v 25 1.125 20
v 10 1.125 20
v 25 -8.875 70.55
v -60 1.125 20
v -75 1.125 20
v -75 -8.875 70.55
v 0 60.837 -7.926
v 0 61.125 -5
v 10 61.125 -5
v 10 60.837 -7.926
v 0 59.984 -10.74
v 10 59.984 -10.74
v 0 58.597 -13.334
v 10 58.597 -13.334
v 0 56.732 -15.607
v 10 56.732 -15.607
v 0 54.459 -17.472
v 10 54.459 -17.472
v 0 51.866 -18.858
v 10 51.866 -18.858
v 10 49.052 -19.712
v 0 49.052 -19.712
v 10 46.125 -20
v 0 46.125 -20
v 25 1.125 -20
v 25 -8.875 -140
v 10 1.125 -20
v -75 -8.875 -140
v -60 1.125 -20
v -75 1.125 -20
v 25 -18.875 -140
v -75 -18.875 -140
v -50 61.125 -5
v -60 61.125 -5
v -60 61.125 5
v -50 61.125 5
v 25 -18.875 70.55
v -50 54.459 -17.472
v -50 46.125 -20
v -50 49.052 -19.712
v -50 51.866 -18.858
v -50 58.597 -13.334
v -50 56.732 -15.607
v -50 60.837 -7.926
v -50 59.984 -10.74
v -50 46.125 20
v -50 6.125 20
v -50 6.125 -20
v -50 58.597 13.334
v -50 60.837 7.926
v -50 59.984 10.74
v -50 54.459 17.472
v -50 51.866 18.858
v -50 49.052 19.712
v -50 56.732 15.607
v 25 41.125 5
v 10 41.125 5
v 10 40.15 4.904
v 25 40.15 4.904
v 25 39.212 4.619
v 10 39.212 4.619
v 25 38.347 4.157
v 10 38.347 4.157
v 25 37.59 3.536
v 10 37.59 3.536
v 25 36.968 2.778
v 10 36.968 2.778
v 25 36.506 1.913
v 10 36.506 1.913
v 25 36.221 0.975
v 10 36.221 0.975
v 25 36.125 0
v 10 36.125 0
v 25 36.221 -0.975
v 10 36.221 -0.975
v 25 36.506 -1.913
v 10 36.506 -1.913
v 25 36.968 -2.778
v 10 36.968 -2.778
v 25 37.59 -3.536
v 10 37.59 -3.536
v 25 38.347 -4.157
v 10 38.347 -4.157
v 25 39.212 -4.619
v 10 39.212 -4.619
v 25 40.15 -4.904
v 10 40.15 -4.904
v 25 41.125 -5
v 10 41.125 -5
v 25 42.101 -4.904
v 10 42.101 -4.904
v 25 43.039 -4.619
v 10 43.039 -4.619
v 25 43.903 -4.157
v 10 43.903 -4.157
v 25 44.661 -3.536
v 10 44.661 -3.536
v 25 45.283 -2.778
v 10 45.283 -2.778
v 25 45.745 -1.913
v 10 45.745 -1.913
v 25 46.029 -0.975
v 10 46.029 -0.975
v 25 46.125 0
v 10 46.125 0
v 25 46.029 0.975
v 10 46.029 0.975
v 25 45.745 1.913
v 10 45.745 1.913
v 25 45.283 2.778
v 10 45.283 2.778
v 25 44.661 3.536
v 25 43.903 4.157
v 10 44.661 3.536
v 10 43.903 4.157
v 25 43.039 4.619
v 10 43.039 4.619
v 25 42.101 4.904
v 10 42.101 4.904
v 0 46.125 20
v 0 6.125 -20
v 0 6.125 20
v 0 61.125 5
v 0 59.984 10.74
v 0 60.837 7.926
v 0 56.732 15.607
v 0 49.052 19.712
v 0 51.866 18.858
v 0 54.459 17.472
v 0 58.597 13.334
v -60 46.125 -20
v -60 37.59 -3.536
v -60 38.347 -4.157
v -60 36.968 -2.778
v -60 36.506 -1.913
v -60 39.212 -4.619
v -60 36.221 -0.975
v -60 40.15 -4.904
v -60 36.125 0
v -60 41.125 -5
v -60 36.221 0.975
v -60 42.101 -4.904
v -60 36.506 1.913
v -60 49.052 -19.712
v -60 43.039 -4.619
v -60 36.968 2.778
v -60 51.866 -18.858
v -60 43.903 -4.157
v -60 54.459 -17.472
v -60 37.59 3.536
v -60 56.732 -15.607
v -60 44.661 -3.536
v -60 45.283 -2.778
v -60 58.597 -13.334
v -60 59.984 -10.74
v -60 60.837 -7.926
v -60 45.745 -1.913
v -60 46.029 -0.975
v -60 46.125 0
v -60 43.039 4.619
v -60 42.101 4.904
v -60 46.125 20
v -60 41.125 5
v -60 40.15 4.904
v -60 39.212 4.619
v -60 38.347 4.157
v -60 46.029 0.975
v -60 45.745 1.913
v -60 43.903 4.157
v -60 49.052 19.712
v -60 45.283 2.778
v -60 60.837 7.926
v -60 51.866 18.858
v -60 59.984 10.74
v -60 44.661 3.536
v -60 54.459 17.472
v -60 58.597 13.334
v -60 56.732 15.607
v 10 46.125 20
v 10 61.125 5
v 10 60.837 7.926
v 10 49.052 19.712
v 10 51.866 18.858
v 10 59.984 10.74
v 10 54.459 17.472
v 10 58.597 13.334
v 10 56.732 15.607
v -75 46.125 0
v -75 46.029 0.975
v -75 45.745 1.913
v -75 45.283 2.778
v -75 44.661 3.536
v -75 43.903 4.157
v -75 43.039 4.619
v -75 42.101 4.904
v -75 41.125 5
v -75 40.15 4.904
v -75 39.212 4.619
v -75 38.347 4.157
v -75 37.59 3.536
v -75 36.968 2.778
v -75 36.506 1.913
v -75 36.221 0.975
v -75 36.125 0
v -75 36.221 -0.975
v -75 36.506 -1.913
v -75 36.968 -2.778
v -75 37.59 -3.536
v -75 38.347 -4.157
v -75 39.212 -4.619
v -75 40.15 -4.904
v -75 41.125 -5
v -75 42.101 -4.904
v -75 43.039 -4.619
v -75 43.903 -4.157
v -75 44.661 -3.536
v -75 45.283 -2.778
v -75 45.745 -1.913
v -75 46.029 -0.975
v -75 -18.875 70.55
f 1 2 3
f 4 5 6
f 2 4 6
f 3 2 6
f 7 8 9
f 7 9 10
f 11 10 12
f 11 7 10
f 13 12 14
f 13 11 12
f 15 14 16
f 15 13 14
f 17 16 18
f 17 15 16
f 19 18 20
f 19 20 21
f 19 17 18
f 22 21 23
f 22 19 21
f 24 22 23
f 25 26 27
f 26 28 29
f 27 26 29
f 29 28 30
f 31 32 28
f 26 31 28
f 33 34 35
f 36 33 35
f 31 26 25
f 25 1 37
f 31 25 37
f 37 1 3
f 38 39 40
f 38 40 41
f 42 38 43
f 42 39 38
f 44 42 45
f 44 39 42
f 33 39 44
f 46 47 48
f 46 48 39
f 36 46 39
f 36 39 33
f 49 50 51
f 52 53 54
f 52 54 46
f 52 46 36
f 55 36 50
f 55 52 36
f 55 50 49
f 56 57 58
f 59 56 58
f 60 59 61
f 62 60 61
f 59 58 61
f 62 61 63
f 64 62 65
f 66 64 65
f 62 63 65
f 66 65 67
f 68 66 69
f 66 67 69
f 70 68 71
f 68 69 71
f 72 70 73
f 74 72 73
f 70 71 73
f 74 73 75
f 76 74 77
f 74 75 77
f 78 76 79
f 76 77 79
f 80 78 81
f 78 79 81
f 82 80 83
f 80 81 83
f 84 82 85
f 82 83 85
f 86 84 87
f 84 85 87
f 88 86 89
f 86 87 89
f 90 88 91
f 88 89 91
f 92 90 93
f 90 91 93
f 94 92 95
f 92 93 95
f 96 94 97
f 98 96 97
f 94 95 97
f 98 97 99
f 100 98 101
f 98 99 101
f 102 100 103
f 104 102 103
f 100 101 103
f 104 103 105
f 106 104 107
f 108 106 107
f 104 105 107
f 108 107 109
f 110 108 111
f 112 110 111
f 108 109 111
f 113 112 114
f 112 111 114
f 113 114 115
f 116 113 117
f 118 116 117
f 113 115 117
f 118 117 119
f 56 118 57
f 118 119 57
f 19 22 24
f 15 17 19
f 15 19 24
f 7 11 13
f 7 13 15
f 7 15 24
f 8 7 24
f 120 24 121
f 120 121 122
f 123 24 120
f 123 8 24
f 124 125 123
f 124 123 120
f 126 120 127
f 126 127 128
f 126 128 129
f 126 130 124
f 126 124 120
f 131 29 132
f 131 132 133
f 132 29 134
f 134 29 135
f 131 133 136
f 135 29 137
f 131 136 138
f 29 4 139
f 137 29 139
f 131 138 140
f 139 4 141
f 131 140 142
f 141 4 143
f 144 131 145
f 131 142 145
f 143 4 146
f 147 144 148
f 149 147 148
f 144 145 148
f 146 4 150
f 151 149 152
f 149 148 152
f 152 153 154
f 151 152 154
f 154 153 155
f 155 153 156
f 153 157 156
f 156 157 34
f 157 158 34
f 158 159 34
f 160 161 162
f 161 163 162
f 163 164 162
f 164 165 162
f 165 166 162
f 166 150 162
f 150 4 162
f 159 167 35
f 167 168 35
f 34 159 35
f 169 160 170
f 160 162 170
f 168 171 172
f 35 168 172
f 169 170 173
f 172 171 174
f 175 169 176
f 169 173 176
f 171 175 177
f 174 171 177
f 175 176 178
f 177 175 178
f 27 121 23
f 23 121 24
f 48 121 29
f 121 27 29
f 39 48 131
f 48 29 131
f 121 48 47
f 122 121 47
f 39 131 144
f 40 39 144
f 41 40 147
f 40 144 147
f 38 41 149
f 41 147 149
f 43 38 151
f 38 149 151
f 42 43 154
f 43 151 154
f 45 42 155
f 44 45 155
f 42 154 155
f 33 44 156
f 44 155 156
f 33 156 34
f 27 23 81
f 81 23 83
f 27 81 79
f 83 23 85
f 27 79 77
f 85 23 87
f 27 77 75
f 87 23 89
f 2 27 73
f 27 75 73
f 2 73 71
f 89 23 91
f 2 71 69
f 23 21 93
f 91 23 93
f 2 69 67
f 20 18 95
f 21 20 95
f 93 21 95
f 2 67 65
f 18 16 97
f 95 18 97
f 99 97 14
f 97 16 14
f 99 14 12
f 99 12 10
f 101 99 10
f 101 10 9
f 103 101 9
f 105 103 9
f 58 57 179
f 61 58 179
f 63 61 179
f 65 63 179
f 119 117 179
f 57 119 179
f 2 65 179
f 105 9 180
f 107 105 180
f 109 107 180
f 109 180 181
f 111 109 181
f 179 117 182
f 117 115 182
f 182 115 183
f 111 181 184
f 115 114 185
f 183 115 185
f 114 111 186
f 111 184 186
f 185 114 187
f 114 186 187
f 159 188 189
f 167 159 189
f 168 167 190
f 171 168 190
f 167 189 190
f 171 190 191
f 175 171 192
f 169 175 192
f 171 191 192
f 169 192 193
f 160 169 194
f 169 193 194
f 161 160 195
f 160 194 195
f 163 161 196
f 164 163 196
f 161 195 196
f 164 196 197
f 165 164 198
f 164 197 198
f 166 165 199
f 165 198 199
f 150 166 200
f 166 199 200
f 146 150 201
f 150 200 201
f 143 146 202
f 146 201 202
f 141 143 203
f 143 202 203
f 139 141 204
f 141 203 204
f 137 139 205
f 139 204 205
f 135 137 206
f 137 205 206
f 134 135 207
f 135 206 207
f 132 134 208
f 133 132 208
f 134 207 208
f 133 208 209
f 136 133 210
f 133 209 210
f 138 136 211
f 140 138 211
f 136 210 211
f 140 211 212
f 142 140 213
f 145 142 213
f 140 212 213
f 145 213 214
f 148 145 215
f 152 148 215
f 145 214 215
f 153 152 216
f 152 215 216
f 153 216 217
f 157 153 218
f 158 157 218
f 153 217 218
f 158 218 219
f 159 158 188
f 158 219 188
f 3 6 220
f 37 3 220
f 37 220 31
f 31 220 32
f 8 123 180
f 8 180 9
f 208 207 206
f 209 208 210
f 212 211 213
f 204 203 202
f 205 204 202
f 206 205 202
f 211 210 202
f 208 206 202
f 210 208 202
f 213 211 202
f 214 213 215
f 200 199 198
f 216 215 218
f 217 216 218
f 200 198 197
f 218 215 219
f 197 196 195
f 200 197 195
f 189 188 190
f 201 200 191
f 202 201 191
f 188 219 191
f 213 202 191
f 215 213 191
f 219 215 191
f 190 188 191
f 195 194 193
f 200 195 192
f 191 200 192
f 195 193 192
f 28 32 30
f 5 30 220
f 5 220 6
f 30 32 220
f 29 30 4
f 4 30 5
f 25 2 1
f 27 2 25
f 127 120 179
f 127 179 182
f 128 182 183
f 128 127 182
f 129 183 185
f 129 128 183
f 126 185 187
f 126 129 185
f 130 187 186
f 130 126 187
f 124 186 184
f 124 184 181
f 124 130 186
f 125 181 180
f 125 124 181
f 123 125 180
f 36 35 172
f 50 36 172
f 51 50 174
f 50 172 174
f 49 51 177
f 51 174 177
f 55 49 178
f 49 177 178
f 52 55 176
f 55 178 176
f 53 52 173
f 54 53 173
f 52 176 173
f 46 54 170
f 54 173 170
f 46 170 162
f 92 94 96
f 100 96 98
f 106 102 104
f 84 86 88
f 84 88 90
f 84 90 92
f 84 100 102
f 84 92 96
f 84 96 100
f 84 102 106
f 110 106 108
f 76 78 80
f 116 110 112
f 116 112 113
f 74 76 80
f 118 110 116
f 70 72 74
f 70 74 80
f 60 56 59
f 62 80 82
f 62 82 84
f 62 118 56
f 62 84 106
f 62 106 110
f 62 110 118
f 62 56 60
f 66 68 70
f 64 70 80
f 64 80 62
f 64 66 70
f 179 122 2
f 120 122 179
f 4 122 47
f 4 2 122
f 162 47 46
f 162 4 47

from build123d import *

# Parameters (mm, degrees)
BOSS_EXTRUDE1_DEPTH = 10
BOSS_EXTRUDE3_DEPTH = 25
SKETCH4_R           = 5
BOSS_EXTRUDE4_DEPTH = 15
BOSS_EXTRUDE6_DEPTH = 15


with BuildPart() as part:
    # Sketch1 → Boss-Extrude1 (new body)
    with BuildSketch(Plane(origin=(0, 0, 0), x_dir=(0, 0, -1), z_dir=(1, 0, 0))):
        with BuildLine():
            Line((-5, 61.125310432), (5, 61.125310432))
            ThreePointArc((5, 61.125310432), (15.606601718, 56.73191215), (20, 46.125310432))
            Line((20, 46.125310432), (20, 1.125310432))
            Line((20, 1.125310432), (140, -8.874689568))
            Line((140, -8.874689568), (140, -18.874689568))
            Line((140, -18.874689568), (-70.549785689, -18.874689568))
            Line((-70.549785689, -18.874689568), (-70.549785689, -8.874689568))
            Line((-70.549785689, -8.874689568), (-20, 1.125310432))
            Line((-20, 1.125310432), (-20, 46.125310432))
            ThreePointArc((-20, 46.125310432), (-15.606601718, 56.73191215), (-5, 61.125310432))
        make_face()
    boss_extrude1 = extrude(amount=BOSS_EXTRUDE1_DEPTH)

    # Sketch3 → Boss-Extrude3 (add)
    with BuildSketch(Plane.ZY):
        Polygon((20, 1.125310432), (70.549785689, -8.874689568), (70.549785689, -18.874689568), (-140, -18.874689568), (-140, -8.874689568), (-20, 1.125310432), (-20, 6.125310432), (20, 6.125310432), align=None)
    boss_extrude3 = extrude(amount=BOSS_EXTRUDE3_DEPTH)

    # Sketch4 → Boss-Extrude4 (add)
    with BuildSketch(Plane(origin=(10, 0, 0), x_dir=(0, 0, -1), z_dir=(1, 0, 0))):
        with Locations((0, 41.125310432)):
            Circle(SKETCH4_R)
    boss_extrude4 = extrude(amount=BOSS_EXTRUDE4_DEPTH)

    # Sketch7 → Boss-Extrude6 (add)
    with BuildSketch(Plane(origin=(10, 0, 0), x_dir=(0, 0, -1), z_dir=(1, 0, 0))):
        Polygon((-70.549785689, -8.874689568), (-20, 1.125310432), (20, 1.125310432), (140, -8.874689568), (140, -18.874689568), (-70.549785689, -18.874689568), align=None)
    boss_extrude6 = extrude(amount=BOSS_EXTRUDE6_DEPTH)

    # Mirror2: Boss-Extrude1, Boss-Extrude3, Boss-Extrude4, Boss-Extrude6 across plane
    add(boss_extrude1.mirror(Plane(origin=(-25, 0, 0), x_dir=(0, 0, 1), z_dir=(1, 0, 0))))
    add(boss_extrude3.mirror(Plane(origin=(-25, 0, 0), x_dir=(0, 0, 1), z_dir=(1, 0, 0))))
    add(boss_extrude4.mirror(Plane(origin=(-25, 0, 0), x_dir=(0, 0, 1), z_dir=(1, 0, 0))))
    add(boss_extrude6.mirror(Plane(origin=(-25, 0, 0), x_dir=(0, 0, 1), z_dir=(1, 0, 0))))


solid = part.part
